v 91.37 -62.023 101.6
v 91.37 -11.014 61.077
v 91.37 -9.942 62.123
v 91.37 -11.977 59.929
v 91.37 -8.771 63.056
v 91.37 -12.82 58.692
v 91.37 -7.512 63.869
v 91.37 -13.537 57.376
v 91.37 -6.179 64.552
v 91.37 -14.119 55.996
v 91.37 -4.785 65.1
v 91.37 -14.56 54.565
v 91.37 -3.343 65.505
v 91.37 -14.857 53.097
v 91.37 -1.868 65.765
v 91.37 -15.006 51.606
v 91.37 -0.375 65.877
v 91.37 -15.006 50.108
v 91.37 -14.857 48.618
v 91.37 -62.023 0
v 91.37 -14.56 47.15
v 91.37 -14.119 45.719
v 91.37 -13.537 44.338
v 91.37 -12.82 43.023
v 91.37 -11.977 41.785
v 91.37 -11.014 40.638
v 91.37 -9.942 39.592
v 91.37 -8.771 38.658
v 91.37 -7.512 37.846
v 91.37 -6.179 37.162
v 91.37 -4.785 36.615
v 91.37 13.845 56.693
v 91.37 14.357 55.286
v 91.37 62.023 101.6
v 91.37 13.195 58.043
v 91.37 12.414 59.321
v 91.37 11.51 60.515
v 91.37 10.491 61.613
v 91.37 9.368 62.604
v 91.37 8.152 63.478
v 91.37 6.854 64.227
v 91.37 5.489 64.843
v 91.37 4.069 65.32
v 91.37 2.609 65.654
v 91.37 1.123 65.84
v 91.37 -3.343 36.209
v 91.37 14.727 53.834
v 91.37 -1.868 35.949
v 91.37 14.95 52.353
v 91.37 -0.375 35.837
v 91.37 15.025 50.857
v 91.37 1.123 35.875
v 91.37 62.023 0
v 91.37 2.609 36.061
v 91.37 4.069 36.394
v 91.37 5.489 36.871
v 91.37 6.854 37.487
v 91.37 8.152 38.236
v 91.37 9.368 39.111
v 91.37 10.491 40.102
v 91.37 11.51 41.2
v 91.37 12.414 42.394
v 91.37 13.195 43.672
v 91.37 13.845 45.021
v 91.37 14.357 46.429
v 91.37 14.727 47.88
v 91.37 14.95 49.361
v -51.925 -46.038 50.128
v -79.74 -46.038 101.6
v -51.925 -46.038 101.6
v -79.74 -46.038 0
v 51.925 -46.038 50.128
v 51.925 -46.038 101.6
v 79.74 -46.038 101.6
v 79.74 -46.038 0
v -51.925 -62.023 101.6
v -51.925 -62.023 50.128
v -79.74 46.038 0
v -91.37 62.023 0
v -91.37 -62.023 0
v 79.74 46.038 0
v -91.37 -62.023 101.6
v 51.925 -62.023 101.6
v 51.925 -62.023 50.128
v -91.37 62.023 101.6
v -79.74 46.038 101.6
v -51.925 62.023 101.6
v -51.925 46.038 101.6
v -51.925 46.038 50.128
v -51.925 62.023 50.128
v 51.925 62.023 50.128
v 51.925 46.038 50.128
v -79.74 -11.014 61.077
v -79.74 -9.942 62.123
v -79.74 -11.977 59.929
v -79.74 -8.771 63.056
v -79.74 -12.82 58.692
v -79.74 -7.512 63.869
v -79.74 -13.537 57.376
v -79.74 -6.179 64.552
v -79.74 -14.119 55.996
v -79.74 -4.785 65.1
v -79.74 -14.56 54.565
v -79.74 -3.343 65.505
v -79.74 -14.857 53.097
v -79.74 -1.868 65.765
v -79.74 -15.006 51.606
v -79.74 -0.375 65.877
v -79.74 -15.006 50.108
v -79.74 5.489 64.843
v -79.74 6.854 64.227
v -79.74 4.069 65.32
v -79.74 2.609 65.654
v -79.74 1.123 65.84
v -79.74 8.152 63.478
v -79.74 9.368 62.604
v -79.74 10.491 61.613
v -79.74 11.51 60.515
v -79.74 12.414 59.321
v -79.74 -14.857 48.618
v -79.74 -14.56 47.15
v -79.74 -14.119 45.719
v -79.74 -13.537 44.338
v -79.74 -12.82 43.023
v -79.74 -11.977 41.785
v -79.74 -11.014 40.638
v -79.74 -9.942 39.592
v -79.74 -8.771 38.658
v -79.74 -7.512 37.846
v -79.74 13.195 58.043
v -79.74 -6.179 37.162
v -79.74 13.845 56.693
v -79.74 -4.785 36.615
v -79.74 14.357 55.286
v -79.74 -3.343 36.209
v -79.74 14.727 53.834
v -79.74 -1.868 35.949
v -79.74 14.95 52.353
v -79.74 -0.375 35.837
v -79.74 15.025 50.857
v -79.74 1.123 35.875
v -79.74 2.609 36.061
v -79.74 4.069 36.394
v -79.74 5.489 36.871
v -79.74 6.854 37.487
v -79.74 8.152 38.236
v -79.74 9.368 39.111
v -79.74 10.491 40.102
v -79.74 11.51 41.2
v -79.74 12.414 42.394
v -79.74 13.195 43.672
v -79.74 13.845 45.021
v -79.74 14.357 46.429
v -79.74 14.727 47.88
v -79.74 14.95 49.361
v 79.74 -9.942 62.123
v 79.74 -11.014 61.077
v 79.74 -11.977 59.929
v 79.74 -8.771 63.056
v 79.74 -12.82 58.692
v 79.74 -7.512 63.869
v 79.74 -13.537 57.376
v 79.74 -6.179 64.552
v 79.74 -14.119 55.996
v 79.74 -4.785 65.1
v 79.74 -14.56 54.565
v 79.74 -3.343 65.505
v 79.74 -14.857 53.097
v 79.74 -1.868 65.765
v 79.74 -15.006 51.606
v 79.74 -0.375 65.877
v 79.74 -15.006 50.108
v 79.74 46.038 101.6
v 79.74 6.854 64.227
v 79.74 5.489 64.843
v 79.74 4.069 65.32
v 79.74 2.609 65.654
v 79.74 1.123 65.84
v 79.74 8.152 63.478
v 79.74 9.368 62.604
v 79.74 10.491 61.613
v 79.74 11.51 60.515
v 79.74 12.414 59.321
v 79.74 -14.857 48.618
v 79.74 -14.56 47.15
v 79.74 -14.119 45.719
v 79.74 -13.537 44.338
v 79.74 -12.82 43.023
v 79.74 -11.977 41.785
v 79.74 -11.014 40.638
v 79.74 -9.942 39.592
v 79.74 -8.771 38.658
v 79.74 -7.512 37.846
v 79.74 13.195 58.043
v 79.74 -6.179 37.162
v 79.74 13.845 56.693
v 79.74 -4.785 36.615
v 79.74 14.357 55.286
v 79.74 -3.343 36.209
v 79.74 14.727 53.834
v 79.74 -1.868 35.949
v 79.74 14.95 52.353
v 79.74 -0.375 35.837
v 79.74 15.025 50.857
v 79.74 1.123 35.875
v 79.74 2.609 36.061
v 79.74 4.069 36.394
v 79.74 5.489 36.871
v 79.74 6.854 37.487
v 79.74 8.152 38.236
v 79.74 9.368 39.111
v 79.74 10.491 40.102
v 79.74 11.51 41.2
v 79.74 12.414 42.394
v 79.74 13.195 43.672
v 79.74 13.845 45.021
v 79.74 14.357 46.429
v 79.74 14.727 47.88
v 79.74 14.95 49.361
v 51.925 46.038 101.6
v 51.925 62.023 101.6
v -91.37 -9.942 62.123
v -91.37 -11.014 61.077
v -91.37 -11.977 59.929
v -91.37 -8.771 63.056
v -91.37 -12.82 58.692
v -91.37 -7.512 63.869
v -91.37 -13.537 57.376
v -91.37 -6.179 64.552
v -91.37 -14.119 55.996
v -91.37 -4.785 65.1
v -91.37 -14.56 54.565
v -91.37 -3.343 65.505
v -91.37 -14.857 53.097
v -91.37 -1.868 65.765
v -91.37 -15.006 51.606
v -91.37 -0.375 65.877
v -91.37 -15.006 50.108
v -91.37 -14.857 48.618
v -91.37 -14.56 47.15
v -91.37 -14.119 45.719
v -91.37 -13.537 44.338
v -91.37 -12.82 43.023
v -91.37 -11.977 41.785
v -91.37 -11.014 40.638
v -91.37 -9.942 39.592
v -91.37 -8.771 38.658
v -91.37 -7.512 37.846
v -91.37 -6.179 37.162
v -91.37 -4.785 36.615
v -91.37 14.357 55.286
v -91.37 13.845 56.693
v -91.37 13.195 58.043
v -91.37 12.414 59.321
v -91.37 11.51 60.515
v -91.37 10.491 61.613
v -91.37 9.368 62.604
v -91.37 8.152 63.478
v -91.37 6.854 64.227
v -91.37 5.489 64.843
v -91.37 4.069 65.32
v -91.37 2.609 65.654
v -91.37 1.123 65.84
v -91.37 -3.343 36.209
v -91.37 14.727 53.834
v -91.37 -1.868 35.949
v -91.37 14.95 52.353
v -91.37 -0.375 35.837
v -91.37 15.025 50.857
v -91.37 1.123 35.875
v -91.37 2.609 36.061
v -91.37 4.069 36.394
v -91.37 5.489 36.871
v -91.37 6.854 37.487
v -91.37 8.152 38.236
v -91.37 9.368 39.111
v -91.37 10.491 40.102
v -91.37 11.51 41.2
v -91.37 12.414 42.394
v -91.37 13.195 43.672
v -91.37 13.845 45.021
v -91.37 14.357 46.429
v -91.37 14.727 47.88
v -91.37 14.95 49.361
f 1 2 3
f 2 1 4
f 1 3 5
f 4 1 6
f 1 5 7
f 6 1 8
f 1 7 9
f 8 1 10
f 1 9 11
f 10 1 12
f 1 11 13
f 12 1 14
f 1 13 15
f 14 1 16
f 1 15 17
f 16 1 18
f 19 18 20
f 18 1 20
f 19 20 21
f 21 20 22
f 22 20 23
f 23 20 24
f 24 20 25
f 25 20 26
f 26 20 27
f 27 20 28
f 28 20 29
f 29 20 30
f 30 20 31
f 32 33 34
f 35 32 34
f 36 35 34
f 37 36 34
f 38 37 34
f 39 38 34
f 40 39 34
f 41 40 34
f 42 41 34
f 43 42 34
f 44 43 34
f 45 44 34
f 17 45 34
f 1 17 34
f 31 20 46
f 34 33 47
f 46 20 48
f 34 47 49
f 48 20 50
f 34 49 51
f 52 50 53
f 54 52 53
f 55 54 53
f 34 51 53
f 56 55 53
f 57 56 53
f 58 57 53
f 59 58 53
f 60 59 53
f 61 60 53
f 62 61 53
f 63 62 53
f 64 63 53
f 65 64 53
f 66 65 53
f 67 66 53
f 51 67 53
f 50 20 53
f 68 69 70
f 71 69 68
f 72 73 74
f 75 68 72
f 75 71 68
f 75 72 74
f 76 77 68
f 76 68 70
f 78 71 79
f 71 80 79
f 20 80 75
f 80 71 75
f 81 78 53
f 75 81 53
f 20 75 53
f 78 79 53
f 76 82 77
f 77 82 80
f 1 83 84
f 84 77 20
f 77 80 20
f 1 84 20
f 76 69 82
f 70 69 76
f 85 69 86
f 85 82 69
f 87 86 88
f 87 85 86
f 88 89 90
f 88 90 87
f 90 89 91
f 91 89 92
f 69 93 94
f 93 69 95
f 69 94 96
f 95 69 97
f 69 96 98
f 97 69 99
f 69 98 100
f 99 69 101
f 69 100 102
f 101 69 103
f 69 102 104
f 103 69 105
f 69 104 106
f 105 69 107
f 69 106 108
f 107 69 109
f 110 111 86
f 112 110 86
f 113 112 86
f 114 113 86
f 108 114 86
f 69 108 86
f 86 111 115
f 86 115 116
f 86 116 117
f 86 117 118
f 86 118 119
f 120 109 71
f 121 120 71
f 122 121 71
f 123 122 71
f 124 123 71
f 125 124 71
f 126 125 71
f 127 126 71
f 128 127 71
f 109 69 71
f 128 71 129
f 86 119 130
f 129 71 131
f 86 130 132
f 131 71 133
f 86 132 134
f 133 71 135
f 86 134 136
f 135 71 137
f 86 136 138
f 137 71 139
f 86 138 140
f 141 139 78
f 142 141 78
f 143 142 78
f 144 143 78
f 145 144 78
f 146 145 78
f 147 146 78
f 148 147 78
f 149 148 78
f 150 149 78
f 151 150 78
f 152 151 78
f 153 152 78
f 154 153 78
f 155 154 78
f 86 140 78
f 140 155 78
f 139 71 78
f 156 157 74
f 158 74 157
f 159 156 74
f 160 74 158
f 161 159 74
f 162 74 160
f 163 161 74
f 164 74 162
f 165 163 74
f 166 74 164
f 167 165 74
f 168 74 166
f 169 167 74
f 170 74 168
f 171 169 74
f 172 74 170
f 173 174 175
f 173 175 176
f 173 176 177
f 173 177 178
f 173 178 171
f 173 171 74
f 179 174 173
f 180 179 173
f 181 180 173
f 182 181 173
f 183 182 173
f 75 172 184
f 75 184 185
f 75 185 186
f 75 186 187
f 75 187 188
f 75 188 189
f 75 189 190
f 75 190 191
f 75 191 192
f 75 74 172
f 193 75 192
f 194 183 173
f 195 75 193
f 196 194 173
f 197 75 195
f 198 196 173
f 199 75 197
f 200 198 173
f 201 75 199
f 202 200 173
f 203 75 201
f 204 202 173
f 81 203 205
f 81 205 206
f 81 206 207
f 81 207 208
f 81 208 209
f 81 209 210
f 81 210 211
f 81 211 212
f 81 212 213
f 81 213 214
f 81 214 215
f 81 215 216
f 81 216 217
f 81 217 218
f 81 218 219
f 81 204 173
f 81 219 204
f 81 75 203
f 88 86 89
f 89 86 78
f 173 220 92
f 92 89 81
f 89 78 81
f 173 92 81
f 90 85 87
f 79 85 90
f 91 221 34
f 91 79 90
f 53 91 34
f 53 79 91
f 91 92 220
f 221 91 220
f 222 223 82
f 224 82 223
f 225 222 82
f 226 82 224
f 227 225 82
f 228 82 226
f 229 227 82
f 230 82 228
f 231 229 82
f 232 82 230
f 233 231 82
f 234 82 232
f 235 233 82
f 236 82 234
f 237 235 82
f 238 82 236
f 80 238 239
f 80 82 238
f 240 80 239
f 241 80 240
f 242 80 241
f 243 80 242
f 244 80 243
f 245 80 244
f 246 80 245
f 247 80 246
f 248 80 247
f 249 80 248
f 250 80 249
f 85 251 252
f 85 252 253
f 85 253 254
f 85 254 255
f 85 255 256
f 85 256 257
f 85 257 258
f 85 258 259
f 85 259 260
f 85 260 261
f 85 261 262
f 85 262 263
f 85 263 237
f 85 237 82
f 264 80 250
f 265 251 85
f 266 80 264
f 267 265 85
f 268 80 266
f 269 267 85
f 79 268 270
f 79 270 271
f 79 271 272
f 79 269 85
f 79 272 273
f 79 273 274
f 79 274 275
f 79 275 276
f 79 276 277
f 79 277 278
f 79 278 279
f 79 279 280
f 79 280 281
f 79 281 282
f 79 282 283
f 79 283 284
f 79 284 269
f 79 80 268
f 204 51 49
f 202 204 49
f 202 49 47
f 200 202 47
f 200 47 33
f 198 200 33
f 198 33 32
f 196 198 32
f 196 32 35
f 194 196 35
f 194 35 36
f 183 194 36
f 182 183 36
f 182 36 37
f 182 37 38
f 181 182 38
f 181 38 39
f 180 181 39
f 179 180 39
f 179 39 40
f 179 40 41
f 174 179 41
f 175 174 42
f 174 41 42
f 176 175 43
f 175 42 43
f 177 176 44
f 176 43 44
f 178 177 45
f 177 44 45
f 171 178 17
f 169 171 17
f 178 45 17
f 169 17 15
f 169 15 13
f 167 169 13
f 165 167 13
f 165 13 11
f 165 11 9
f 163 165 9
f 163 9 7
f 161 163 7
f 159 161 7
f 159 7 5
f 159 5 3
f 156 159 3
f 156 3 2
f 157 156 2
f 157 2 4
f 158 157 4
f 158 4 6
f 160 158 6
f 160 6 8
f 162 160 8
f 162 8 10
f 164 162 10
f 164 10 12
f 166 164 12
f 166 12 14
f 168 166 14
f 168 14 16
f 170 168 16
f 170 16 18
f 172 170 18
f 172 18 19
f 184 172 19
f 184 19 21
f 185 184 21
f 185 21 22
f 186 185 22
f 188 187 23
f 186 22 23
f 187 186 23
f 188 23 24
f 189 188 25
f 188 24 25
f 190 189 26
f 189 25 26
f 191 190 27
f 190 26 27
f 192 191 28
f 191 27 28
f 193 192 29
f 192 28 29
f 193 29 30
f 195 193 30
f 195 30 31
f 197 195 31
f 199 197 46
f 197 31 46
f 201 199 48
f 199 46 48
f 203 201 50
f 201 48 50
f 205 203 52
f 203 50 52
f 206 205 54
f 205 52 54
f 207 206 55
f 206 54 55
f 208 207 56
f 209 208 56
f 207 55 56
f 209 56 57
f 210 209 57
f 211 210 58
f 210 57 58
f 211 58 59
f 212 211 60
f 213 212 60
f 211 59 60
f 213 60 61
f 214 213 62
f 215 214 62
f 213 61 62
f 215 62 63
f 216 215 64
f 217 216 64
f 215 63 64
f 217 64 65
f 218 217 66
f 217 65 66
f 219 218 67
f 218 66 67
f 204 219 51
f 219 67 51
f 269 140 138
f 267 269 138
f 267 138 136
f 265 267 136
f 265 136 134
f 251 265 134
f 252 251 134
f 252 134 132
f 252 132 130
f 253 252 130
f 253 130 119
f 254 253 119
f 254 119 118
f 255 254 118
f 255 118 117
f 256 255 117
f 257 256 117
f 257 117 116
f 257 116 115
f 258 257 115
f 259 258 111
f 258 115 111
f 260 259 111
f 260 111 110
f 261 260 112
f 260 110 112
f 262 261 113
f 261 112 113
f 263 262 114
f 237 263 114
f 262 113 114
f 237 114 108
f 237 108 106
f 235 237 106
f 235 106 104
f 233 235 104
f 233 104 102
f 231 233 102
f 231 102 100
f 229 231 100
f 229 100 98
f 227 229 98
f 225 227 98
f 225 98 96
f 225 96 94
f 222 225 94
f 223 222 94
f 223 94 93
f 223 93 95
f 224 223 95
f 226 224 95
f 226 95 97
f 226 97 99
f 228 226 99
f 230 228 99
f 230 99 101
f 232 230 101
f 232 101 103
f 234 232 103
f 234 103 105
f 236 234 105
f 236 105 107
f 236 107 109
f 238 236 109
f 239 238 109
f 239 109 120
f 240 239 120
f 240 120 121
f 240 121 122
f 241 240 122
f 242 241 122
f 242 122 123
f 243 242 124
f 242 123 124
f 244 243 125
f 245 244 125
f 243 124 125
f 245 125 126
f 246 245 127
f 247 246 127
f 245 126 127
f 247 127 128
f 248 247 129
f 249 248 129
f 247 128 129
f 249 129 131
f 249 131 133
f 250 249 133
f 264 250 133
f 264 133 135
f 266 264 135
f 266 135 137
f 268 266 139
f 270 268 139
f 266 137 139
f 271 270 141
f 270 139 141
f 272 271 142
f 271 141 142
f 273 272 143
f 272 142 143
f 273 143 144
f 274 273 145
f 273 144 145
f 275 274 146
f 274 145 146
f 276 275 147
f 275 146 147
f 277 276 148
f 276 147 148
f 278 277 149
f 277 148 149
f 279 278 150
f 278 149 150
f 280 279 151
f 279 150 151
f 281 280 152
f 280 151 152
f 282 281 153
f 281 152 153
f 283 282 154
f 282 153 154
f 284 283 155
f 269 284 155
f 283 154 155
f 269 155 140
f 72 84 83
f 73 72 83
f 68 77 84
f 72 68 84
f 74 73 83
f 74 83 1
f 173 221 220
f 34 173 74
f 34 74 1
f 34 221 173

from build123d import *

# Parameters (mm, degrees)
F0_W     = 182.7391684055
F0_H     = 124.0453347564
F0_W_2   = 159.4799607992
F0_H_2   = 92.0757874846
F1_DEPTH = 101.6
F2_W     = 103.849850595
F2_H     = 51.4723447323
F3_DEPTH = 1270
F4_R     = 15.0246313373
F5_DEPTH = 1270


with BuildPart() as f1:
    # F0 (on Top) → F1 (new body)
    with BuildSketch(Plane.XY):
        Rectangle(F0_W, F0_H)
        Rectangle(F0_W_2, F0_H_2, mode=Mode.SUBTRACT)
    extrude(amount=F1_DEPTH)

    # F2 (on face) → F3 (cut)
    with BuildSketch(Plane.XZ.offset(62.0226673782)):
        with Locations((0, 75.8638276339)):
            Rectangle(F2_W, F2_H)
    extrude(amount=-F3_DEPTH, mode=Mode.SUBTRACT)

    # F4 (on face) → F5 (cut)
    with BuildSketch(Plane.YZ.offset(91.3695842028)):
        with Locations((0, 50.8573576808)):
            Circle(F4_R)
    extrude(amount=-F5_DEPTH, mode=Mode.SUBTRACT)


solid = f1.part
